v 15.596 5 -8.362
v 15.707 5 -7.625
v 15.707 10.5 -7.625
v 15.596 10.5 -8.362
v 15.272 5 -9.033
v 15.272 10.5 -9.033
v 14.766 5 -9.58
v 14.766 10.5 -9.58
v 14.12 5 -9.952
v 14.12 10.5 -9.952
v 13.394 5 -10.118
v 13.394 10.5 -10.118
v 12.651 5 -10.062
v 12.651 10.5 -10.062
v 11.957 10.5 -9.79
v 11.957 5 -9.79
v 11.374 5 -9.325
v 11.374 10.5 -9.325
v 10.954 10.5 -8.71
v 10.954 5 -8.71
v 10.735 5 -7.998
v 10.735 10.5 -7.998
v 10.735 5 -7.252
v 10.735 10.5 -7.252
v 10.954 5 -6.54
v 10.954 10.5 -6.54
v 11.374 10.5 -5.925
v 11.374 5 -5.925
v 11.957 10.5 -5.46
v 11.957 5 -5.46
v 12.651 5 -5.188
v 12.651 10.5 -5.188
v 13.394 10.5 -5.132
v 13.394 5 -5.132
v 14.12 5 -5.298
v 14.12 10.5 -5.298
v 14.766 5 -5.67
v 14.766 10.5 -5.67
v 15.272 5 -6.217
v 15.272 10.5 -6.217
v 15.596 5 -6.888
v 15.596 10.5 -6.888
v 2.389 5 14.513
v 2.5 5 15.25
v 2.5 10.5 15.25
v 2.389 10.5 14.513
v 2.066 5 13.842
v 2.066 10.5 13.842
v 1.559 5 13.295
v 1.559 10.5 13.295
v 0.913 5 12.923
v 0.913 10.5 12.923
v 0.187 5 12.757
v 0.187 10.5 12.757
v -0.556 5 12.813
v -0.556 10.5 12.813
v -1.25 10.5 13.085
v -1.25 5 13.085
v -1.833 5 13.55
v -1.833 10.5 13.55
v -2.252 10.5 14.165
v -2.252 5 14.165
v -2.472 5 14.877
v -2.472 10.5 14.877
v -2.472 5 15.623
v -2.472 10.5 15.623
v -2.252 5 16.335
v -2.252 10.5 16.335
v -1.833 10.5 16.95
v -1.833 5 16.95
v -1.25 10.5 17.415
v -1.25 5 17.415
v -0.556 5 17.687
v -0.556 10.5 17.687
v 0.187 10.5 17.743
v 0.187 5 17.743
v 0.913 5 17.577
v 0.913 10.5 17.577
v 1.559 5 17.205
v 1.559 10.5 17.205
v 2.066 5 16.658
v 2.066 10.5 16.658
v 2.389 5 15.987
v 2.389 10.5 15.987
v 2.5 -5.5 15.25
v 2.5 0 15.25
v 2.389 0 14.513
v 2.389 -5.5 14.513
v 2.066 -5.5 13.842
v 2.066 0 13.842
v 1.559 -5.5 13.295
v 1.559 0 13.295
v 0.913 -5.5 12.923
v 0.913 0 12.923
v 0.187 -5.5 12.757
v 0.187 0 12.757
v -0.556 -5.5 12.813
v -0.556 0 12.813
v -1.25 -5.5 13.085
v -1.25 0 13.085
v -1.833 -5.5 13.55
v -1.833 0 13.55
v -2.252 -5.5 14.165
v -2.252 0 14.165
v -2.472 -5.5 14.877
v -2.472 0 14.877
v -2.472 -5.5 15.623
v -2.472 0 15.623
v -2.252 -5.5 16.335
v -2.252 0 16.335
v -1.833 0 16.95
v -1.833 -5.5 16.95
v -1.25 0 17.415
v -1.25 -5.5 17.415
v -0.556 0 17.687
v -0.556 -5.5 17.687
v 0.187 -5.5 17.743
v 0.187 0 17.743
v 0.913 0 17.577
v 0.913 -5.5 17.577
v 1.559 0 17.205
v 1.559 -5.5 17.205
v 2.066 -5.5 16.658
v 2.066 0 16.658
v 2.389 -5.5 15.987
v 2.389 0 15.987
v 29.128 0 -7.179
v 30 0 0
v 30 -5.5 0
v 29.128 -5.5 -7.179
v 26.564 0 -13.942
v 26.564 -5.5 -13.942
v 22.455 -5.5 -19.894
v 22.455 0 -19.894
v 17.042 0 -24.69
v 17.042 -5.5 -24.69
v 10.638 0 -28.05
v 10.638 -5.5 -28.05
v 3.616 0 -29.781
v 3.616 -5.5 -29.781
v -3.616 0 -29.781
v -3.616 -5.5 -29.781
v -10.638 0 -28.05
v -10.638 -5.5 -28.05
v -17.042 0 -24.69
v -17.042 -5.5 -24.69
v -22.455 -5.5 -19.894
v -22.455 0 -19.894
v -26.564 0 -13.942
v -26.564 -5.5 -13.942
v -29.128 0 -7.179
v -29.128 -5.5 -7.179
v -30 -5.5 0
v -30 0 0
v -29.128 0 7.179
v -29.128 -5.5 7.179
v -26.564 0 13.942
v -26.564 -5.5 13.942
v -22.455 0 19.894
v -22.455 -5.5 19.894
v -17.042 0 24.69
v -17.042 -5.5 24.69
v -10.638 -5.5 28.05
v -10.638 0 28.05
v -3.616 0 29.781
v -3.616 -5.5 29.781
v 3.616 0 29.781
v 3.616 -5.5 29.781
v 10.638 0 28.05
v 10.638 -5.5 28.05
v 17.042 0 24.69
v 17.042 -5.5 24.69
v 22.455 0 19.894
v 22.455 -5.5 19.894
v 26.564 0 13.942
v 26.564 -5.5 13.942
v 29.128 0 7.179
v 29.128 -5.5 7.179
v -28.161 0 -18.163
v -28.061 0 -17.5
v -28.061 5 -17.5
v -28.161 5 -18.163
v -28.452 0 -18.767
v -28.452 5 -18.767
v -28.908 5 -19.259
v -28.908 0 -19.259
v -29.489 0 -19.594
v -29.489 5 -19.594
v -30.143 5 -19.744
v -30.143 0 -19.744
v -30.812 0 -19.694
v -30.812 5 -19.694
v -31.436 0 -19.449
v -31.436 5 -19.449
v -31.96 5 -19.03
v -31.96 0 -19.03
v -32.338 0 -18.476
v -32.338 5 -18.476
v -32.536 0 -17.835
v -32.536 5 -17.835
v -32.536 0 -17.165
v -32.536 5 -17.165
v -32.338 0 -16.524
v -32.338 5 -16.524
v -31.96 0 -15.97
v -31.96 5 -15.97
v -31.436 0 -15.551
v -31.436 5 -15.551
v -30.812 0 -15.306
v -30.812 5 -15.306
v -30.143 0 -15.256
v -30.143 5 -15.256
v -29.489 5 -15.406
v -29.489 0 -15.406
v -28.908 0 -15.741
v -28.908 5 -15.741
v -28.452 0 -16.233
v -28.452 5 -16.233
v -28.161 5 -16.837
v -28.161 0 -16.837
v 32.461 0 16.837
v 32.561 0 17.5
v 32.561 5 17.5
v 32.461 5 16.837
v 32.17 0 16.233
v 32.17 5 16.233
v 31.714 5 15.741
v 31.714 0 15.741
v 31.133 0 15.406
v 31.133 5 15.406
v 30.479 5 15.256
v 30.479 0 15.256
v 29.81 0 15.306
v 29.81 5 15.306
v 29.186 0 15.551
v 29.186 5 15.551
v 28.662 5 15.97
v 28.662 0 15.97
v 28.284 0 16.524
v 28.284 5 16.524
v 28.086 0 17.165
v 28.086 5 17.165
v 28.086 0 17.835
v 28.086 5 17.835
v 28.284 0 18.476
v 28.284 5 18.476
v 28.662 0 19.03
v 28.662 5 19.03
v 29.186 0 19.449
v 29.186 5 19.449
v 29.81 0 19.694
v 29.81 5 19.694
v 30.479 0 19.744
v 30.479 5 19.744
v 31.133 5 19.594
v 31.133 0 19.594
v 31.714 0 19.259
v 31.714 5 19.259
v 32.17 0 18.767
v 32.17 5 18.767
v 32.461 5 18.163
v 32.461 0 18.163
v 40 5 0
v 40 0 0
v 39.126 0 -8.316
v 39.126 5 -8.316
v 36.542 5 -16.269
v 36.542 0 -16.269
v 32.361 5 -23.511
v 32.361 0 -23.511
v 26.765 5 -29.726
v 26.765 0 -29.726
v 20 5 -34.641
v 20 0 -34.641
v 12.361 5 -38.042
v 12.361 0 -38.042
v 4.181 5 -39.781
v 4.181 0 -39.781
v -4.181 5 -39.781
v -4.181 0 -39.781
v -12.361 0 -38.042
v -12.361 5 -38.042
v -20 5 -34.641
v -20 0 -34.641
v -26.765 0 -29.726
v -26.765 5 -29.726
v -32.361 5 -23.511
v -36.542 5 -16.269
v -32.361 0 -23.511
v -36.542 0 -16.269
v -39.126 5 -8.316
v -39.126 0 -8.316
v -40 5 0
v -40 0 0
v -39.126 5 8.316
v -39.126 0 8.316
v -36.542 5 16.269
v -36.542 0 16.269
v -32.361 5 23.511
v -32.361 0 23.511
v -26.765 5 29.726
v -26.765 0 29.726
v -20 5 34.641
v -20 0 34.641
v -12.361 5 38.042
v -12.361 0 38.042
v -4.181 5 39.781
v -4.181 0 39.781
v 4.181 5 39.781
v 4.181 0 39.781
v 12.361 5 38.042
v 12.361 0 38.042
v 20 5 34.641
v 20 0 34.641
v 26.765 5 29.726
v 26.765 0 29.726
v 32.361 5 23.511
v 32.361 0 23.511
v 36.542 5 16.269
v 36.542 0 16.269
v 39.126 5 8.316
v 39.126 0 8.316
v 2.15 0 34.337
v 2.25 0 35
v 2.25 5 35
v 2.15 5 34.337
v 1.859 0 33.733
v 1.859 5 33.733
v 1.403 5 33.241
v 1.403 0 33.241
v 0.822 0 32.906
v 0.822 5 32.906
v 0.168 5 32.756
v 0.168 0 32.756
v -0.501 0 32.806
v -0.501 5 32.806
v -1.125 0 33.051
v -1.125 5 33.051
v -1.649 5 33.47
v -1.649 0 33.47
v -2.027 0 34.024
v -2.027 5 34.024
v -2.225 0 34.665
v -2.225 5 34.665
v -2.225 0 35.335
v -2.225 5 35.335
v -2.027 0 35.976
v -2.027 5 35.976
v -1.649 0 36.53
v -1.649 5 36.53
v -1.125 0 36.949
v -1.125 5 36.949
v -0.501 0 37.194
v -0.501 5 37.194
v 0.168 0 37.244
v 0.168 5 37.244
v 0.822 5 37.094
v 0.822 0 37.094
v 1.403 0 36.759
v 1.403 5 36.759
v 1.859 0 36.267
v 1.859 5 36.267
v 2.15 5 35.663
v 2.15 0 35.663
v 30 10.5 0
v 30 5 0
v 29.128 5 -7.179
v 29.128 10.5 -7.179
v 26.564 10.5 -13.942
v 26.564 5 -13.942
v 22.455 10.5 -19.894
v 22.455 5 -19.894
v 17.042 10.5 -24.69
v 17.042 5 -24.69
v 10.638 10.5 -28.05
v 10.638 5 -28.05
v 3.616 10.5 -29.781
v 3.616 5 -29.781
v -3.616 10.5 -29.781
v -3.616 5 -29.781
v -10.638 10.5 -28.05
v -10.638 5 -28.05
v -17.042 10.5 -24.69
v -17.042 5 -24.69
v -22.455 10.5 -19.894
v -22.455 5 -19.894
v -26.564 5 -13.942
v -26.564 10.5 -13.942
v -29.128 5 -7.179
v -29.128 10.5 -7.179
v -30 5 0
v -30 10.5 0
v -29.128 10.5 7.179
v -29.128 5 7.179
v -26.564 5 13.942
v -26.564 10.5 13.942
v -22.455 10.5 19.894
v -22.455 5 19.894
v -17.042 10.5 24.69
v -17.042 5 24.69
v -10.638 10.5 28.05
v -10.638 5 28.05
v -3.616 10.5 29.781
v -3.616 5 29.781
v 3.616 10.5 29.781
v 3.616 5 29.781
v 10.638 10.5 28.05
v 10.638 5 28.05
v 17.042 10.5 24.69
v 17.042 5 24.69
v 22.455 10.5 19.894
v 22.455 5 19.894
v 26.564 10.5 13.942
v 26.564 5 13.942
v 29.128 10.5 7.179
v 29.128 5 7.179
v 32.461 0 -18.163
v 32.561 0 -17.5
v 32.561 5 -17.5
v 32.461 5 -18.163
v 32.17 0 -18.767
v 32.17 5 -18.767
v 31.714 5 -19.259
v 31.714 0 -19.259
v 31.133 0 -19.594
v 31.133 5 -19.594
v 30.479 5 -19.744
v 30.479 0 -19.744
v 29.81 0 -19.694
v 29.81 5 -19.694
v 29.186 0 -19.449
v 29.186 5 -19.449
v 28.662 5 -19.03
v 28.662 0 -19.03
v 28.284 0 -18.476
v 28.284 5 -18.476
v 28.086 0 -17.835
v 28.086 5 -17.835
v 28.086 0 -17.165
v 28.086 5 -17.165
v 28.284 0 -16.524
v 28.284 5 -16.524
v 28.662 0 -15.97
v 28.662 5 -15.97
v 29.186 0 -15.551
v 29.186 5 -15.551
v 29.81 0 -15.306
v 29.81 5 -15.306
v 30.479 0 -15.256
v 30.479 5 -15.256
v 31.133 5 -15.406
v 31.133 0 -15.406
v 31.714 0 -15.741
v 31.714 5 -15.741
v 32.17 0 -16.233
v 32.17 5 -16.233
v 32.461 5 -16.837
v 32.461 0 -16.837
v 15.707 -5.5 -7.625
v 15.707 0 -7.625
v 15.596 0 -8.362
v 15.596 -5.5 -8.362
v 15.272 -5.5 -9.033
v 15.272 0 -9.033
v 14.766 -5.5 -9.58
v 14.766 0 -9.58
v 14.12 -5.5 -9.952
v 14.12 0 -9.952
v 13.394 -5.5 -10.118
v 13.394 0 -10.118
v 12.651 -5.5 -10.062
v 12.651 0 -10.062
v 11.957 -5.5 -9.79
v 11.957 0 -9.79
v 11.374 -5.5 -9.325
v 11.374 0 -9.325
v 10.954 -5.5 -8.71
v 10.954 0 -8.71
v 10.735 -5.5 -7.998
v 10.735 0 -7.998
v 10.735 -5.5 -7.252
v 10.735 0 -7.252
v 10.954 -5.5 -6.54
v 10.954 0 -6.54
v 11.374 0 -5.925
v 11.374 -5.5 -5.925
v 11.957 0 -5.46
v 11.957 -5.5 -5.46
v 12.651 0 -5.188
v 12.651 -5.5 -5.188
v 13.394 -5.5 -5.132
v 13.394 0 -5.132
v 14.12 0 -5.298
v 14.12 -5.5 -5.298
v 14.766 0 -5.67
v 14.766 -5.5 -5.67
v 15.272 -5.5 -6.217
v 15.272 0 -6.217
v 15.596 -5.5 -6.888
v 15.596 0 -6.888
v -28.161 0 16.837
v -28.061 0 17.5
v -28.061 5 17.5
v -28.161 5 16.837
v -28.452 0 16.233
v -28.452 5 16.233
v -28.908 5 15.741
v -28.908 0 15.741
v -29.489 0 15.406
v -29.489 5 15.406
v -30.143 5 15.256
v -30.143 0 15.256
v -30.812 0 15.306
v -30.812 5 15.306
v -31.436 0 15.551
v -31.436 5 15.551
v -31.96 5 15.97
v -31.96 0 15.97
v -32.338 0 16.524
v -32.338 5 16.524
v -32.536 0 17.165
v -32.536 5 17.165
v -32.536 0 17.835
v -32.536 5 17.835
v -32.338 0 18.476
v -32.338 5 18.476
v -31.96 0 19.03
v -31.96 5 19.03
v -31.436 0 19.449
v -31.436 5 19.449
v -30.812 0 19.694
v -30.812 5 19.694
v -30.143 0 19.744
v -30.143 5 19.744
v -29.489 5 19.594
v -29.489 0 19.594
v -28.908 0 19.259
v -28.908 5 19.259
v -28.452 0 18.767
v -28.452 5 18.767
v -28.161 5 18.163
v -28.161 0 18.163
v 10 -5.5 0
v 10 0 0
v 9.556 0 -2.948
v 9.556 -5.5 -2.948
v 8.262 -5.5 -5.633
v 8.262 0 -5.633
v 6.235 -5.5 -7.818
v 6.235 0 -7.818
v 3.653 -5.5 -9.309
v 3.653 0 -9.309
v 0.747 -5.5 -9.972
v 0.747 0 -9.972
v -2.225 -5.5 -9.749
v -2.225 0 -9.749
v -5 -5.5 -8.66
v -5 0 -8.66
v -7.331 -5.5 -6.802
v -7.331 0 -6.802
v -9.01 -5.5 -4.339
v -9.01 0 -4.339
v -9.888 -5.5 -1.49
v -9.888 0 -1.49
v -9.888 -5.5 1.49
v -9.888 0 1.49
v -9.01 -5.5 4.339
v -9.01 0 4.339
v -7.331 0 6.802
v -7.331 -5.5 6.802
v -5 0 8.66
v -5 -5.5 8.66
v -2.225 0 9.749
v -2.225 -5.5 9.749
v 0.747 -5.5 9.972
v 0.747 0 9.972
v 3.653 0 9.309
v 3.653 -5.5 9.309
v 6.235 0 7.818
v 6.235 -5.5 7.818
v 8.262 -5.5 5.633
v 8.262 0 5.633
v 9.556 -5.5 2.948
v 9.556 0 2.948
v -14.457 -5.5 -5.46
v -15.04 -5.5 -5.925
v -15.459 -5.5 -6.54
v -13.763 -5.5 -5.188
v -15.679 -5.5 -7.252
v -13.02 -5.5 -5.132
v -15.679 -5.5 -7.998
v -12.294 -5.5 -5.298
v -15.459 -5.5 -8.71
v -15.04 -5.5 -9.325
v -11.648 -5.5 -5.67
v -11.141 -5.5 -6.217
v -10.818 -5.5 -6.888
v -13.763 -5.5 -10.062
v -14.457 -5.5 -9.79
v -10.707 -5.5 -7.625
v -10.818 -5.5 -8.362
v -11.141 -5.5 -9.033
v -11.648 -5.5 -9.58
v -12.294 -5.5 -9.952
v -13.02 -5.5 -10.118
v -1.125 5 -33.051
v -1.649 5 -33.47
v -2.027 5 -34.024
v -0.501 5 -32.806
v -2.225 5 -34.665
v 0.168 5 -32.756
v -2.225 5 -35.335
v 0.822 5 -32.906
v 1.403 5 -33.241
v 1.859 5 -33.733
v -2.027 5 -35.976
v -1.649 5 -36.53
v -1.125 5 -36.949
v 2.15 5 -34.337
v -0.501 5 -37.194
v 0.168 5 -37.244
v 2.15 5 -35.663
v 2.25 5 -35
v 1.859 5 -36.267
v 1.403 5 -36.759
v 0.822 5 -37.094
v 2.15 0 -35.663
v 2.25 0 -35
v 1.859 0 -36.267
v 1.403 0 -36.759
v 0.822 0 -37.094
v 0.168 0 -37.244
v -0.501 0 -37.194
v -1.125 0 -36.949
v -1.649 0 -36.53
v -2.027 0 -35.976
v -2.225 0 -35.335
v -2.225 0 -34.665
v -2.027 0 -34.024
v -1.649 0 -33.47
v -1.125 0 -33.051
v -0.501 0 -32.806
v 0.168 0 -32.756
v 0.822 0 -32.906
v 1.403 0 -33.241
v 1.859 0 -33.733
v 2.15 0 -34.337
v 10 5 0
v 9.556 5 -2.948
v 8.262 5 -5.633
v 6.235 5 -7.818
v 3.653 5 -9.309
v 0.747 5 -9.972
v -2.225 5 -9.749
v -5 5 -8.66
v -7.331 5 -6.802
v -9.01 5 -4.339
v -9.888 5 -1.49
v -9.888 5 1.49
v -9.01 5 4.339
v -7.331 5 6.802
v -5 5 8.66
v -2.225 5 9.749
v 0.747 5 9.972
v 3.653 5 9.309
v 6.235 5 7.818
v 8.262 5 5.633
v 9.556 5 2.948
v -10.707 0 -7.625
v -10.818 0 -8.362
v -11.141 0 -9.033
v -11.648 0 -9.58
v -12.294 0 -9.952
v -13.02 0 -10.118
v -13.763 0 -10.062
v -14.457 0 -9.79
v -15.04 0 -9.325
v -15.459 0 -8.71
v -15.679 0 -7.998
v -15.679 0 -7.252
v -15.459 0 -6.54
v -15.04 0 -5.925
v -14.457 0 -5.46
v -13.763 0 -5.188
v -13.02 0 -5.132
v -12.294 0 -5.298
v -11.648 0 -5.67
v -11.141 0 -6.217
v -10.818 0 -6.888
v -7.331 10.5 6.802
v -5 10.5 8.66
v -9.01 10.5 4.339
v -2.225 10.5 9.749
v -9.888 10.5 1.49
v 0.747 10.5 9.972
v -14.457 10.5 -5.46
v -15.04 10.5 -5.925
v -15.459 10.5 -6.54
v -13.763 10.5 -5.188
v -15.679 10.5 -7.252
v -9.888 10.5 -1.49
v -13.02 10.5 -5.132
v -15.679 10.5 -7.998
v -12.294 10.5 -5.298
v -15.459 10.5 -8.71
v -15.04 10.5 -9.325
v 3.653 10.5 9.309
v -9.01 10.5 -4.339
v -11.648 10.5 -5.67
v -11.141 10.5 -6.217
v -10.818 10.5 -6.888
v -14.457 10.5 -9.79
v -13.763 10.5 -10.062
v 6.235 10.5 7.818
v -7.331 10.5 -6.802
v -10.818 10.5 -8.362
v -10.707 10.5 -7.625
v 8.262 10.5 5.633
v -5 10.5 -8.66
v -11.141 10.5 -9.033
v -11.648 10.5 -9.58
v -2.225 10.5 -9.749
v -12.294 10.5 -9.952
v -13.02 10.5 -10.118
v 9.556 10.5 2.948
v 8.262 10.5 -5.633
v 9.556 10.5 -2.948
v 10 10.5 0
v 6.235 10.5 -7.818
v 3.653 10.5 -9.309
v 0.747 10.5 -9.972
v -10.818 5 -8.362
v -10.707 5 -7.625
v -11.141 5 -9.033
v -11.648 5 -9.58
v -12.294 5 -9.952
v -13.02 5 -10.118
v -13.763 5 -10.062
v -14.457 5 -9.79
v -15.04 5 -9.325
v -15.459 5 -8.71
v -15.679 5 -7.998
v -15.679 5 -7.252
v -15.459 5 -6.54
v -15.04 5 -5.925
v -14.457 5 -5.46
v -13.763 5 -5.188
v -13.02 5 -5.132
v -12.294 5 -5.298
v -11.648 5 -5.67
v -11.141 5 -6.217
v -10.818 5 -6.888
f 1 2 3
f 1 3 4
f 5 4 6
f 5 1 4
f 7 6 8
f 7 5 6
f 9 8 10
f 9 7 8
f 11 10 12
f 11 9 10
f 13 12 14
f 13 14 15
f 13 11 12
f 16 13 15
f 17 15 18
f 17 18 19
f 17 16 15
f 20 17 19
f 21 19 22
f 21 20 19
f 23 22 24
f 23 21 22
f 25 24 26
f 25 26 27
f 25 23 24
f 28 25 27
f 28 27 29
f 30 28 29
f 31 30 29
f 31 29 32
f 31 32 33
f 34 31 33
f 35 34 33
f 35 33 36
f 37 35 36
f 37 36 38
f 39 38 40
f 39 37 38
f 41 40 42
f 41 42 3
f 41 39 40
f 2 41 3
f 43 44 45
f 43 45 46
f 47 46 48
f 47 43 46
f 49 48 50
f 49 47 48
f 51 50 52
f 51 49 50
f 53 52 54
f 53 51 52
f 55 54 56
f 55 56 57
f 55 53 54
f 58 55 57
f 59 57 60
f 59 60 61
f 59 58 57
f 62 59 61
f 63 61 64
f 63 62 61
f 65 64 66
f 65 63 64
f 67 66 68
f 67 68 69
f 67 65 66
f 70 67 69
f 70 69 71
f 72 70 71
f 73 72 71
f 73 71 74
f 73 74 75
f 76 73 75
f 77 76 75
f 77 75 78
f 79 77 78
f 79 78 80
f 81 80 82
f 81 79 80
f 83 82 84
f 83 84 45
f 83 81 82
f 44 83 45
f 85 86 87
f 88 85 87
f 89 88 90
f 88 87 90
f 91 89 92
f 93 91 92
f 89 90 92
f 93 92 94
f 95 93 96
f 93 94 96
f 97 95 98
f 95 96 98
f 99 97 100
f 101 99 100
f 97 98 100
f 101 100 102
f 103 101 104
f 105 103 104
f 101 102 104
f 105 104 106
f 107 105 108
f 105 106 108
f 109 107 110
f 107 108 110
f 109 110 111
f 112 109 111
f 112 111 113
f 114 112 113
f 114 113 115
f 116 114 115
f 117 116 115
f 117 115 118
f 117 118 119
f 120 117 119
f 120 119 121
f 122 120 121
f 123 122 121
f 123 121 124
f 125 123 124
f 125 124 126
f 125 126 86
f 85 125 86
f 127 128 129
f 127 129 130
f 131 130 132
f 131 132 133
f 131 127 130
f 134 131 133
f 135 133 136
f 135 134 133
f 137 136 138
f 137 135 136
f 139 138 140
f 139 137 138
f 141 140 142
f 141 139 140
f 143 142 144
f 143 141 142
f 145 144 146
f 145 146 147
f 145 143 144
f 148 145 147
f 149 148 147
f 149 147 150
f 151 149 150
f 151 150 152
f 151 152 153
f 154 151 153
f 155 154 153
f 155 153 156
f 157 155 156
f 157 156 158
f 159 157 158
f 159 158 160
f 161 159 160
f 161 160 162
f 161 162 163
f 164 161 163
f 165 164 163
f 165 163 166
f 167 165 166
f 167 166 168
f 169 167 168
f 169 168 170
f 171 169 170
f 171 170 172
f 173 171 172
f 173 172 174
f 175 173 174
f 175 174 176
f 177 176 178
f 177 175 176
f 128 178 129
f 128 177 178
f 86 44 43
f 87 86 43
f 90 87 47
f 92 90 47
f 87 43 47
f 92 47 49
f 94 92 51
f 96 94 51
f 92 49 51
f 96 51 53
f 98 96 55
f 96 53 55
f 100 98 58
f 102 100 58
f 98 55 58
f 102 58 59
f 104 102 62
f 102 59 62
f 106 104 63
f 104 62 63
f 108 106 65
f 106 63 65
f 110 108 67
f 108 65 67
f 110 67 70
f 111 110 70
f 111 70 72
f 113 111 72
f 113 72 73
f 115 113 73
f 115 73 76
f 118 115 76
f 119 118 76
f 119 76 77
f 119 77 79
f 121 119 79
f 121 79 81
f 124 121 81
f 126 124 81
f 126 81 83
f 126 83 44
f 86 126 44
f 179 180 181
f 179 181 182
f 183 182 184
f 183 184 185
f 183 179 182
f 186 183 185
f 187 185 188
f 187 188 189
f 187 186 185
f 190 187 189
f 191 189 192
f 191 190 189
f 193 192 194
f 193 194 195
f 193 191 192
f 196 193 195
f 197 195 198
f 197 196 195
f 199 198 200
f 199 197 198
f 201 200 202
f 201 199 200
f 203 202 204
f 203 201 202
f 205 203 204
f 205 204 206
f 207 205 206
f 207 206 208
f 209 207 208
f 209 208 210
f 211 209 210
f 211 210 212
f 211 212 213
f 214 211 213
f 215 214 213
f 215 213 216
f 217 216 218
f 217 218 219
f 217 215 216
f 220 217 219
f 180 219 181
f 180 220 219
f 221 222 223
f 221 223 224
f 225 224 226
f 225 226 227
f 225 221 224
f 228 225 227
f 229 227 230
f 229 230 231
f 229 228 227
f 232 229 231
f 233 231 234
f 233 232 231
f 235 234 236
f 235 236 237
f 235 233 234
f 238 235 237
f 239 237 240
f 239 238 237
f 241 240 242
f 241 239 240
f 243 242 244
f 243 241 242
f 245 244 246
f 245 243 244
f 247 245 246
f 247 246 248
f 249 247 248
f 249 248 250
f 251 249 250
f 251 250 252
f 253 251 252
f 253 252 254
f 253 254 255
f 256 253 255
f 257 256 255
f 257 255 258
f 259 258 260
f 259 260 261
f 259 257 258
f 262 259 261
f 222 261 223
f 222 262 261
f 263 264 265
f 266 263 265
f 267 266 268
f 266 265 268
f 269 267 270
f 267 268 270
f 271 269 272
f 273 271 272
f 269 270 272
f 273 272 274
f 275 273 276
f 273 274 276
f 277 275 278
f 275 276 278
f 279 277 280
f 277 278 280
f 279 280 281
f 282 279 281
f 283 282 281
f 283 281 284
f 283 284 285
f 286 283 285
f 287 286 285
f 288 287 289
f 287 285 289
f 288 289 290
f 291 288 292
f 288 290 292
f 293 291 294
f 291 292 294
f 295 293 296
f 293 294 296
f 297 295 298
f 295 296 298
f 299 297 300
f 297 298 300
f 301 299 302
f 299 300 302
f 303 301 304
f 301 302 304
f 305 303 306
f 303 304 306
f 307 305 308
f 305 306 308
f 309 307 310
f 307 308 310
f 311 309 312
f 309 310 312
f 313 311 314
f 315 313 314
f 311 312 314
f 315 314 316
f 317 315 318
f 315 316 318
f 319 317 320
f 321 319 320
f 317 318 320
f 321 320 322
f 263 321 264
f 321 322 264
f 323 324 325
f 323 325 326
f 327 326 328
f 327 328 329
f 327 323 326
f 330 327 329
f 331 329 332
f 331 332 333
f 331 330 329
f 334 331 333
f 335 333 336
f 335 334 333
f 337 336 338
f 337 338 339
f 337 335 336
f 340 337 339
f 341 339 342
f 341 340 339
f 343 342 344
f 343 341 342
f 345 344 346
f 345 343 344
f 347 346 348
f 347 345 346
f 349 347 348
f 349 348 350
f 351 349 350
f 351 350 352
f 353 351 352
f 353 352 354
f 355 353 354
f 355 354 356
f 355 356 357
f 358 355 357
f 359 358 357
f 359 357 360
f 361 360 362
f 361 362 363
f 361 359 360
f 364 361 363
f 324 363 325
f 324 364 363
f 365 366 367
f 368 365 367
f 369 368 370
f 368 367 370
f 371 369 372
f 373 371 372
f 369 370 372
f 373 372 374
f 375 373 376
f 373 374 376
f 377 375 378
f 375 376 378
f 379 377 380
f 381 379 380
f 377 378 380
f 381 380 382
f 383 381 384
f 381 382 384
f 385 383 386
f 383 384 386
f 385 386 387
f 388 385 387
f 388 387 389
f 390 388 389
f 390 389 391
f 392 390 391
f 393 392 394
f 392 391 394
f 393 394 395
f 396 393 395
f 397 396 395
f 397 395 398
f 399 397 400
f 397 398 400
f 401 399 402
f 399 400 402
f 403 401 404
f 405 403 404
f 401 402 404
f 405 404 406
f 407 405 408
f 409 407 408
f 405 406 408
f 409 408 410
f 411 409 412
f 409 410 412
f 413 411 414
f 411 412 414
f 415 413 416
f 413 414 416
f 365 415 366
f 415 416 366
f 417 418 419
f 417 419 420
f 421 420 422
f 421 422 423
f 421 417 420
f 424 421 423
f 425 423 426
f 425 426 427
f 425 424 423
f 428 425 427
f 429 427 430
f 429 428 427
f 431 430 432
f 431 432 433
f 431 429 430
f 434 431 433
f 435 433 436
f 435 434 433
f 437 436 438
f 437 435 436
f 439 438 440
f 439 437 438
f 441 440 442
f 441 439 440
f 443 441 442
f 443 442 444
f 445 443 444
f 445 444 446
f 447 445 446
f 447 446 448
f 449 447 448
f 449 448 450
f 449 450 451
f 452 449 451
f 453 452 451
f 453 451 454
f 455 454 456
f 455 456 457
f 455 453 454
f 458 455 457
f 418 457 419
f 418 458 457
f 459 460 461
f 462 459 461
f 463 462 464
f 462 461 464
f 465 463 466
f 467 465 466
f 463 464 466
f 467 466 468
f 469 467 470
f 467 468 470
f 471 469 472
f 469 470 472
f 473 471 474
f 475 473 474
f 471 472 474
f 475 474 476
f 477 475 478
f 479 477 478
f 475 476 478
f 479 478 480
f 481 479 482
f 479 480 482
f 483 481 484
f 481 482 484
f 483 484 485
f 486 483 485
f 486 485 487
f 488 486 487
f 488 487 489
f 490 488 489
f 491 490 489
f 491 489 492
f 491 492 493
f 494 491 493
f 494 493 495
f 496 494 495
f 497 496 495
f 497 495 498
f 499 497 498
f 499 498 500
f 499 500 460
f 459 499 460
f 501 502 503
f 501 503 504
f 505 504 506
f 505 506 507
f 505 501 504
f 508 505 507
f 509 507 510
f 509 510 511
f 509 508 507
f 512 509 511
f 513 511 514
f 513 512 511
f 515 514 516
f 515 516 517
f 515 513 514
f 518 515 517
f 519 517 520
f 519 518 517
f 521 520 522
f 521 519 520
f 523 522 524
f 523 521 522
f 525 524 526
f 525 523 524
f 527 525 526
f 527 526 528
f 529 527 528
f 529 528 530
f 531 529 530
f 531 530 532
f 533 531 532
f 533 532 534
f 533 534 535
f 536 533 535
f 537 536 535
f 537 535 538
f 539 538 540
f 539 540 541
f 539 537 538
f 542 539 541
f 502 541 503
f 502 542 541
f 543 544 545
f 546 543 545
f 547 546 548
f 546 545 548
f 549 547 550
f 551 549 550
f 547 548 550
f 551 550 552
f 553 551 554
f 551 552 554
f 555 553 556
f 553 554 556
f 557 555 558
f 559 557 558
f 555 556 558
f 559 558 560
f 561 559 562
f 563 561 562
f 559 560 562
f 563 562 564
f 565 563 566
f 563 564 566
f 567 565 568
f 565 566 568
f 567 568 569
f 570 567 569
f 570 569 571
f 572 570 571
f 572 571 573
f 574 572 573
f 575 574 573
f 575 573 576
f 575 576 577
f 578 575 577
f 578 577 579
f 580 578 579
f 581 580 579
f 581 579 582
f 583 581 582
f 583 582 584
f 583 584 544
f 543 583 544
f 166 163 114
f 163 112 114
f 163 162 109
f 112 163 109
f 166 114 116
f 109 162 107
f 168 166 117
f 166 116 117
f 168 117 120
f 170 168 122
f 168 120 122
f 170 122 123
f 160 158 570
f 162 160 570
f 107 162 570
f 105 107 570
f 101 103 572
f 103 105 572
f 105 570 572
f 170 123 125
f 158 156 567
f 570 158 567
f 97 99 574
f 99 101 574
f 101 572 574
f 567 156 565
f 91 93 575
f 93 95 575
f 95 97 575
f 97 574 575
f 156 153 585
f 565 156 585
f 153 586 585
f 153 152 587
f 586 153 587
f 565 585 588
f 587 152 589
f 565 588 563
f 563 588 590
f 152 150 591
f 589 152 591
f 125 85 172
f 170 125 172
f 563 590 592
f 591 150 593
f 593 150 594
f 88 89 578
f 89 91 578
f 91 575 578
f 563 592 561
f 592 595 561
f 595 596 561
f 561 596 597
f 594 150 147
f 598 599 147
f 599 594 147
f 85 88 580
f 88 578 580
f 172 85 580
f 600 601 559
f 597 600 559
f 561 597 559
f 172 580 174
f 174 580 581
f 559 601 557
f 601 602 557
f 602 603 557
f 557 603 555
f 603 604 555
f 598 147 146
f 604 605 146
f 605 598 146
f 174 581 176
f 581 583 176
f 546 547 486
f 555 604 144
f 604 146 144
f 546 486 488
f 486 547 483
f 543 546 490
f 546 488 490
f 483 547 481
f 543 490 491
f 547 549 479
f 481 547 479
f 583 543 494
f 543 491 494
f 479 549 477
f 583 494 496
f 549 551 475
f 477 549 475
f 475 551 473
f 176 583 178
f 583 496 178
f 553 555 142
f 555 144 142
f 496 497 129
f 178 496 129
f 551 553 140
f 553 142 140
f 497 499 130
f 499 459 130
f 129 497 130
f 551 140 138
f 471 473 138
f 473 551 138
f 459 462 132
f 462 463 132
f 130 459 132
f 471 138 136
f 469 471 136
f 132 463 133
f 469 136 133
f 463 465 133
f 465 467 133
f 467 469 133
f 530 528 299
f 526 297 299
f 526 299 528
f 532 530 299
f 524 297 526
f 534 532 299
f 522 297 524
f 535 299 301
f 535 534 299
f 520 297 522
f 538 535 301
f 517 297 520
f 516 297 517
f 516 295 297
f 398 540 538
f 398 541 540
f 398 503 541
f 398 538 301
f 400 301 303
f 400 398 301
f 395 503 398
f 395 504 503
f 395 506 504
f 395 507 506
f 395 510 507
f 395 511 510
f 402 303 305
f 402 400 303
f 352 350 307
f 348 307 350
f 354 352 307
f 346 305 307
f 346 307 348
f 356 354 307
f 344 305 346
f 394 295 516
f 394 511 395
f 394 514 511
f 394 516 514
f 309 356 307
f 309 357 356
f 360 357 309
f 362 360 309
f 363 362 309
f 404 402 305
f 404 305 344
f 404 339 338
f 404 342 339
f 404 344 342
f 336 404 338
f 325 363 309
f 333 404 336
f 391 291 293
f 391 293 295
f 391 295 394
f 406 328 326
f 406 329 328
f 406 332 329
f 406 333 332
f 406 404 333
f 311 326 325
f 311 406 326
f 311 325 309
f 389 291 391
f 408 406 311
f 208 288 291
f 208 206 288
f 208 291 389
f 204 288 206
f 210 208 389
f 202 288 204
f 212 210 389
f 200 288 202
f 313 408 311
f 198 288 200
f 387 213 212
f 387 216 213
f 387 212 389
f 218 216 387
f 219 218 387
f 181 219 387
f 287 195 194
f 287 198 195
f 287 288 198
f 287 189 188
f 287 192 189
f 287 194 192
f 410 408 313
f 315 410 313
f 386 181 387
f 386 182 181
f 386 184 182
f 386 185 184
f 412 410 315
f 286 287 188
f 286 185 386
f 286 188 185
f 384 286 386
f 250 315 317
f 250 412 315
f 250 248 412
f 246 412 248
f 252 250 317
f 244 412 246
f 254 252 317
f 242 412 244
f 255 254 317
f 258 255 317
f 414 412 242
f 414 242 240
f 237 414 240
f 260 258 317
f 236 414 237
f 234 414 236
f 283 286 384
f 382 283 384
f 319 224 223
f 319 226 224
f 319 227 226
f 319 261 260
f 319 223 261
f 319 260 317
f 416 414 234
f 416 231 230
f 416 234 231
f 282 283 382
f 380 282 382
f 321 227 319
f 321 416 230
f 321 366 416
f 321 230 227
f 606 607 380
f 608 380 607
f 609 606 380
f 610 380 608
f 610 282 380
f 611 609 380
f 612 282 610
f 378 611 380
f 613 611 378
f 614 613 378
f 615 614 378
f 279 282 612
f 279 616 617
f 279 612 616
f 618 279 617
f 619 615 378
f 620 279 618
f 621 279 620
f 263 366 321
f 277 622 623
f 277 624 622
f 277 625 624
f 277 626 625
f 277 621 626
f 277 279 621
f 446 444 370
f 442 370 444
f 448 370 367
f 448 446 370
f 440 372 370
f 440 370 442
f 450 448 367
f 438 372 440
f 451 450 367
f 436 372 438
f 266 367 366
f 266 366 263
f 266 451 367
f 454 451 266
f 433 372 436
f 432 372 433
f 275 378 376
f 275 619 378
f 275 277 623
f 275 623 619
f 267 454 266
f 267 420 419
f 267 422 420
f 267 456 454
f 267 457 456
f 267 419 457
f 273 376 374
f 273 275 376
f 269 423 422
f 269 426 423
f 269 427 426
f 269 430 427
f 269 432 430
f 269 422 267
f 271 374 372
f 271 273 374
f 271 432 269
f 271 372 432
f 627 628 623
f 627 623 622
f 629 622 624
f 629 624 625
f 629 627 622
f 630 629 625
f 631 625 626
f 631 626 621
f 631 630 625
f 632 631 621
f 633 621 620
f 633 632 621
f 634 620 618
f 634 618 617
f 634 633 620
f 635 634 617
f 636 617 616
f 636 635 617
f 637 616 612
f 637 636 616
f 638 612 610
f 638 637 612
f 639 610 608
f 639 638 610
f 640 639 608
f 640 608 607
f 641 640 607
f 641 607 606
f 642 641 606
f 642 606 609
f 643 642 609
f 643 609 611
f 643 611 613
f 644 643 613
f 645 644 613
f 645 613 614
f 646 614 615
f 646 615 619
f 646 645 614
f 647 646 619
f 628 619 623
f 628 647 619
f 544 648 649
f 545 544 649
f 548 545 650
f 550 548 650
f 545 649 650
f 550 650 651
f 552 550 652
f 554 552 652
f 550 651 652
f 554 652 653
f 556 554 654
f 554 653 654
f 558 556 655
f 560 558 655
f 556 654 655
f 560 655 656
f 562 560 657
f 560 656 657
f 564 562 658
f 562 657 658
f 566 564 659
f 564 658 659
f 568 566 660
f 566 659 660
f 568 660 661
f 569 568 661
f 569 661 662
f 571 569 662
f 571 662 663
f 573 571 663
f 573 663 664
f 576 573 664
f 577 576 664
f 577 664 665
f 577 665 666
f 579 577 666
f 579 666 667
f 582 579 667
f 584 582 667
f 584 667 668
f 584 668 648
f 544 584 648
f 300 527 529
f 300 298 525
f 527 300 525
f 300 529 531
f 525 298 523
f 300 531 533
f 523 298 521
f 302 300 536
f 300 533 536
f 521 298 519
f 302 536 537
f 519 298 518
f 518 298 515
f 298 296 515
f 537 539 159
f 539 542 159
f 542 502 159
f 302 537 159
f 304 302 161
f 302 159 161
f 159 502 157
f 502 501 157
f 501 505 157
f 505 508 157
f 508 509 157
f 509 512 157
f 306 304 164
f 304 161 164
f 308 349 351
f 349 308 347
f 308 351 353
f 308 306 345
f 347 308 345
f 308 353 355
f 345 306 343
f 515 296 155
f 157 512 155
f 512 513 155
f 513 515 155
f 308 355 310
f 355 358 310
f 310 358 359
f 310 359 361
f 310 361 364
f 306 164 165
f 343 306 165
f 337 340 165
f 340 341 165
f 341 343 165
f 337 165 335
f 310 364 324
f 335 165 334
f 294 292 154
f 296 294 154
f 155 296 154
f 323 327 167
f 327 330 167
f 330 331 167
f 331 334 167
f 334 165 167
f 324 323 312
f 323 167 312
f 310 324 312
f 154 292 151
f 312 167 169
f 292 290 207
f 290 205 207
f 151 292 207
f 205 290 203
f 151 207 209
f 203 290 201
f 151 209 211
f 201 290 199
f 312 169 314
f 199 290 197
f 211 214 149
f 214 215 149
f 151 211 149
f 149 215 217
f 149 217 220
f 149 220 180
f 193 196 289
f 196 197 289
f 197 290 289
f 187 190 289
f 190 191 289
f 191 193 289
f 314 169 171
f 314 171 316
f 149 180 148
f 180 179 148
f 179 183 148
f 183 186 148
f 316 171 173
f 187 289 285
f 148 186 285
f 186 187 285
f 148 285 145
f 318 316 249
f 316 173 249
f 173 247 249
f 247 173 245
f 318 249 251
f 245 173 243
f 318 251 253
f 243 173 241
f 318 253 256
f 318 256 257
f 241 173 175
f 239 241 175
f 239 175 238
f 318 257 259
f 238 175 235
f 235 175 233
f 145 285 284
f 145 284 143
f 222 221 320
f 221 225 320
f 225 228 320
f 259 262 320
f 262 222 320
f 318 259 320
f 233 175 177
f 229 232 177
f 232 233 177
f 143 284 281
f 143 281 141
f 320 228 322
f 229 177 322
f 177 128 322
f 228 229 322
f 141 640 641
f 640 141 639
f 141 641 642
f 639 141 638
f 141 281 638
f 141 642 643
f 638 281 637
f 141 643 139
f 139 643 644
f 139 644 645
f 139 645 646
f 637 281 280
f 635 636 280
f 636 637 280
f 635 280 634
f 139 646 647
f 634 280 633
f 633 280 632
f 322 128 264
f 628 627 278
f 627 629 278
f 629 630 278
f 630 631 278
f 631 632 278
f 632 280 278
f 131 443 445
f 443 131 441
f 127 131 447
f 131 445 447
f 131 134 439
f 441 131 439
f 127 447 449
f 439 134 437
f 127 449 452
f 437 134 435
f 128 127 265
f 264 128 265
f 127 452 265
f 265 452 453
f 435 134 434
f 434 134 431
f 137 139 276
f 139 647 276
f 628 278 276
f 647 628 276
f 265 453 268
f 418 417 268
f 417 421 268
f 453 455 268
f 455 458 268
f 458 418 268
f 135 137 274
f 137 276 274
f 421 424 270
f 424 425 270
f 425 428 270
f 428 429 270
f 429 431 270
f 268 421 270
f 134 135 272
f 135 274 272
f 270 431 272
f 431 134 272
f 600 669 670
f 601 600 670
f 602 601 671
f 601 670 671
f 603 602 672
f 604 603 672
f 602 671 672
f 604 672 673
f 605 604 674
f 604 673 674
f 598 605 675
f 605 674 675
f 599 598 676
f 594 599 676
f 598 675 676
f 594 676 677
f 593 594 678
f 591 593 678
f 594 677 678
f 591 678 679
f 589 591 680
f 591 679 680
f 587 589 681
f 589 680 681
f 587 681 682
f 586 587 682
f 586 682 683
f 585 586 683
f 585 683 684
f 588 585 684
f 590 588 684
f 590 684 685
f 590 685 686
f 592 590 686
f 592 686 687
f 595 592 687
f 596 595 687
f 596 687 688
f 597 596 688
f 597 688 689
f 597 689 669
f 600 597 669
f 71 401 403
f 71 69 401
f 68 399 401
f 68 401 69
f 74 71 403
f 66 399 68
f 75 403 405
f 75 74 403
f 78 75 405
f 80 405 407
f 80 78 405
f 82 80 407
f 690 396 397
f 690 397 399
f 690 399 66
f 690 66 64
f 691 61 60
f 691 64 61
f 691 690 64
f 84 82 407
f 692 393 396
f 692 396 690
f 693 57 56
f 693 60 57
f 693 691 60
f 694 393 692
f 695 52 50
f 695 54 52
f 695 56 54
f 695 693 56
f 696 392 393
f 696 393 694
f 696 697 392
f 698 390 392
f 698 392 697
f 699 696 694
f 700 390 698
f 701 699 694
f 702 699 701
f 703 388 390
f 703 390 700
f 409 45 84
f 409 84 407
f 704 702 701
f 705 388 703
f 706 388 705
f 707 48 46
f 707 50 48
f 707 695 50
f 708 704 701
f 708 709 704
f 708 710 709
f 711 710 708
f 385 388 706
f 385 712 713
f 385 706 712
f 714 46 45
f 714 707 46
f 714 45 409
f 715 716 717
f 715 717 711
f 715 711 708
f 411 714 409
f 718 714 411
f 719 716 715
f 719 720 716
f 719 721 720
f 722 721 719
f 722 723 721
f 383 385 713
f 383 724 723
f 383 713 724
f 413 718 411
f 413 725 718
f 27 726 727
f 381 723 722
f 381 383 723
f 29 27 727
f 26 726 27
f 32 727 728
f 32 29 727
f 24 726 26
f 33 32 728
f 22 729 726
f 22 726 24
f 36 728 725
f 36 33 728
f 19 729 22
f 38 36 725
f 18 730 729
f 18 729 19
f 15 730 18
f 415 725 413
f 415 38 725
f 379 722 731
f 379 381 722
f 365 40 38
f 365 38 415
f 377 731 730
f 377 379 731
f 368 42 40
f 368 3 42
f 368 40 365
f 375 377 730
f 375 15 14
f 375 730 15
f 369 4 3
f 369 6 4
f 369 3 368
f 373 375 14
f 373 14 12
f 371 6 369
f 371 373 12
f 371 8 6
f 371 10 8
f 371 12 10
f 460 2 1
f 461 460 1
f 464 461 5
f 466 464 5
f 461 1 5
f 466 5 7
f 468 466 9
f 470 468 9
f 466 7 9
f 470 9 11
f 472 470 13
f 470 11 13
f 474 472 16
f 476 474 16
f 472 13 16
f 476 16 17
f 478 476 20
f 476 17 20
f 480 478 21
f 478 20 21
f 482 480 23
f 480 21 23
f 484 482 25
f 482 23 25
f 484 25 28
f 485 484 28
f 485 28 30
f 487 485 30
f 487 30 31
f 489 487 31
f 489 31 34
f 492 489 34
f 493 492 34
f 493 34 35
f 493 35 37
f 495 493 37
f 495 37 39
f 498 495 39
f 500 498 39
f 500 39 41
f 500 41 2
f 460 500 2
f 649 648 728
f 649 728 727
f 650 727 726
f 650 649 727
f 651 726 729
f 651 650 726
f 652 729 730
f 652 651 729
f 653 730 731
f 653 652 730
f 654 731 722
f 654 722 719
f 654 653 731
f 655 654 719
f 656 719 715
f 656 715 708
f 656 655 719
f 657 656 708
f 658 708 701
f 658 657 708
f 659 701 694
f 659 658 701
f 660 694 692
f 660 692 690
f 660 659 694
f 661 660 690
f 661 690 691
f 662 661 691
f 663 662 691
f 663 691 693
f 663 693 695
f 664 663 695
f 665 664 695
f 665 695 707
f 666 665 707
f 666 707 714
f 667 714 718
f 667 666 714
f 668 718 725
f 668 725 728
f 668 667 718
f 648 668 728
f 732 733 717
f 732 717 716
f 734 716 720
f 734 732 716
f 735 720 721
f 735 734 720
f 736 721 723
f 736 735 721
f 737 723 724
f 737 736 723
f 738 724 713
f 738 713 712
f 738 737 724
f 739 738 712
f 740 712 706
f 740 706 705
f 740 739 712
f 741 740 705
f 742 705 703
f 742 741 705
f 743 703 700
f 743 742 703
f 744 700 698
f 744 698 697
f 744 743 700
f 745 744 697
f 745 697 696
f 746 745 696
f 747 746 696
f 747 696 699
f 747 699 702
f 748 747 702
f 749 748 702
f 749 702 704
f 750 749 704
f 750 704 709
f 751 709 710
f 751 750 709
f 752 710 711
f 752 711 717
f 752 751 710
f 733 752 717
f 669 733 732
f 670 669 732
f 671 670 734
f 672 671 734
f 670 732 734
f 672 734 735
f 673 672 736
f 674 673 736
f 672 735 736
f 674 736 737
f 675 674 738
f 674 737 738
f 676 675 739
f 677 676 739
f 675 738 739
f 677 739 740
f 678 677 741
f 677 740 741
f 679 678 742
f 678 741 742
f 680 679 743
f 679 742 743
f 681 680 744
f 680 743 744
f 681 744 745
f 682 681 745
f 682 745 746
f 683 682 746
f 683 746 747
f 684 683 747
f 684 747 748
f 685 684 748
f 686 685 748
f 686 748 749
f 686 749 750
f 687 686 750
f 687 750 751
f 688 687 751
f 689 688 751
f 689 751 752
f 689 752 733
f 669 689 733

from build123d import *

# Parameters (mm, degrees)
SKETCH1_R                = 40
SKETCH1_R_2              = 2.25
BOSS_EXTRUDE1_DEPTH      = 5
SKETCH2_R                = 30
SKETCH2_R_2              = 10
SKETCH2_R_3              = 2.5
BOSS_EXTRUDE2_DEPTH      = 5.5
BOSS_EXTRUDE2_DEPTH_BACK = 10.5
SKETCH3_R                = 2.5
SKETCH3_R_2              = 10
CUT_EXTRUDE1_DEPTH       = 17


with BuildPart() as part:
    # Sketch1 → Boss-Extrude1 (new body)
    with BuildSketch(Plane(origin=(0, 0, 0), x_dir=(1, 0, 0), z_dir=(0, 1, 0))):
        Circle(SKETCH1_R)
        with Locations((0, 35)):
            Circle(SKETCH1_R_2, mode=Mode.SUBTRACT)
        with Locations((30.310889132, 17.5)):
            Circle(SKETCH1_R_2, mode=Mode.SUBTRACT)
        with Locations((30.310889132, -17.5)):
            Circle(SKETCH1_R_2, mode=Mode.SUBTRACT)
        with Locations((0, -35)):
            Circle(SKETCH1_R_2, mode=Mode.SUBTRACT)
        with Locations((-30.310889132, -17.5)):
            Circle(SKETCH1_R_2, mode=Mode.SUBTRACT)
        with Locations((-30.310889132, 17.5)):
            Circle(SKETCH1_R_2, mode=Mode.SUBTRACT)
    extrude(amount=BOSS_EXTRUDE1_DEPTH)

    # Sketch2 → Boss-Extrude2 (add, two sides)
    with BuildSketch(Plane(origin=(0, 5, 0), x_dir=(1, 0, 0), z_dir=(0, 1, 0))) as boss_extrude2_sk:
        Circle(SKETCH2_R)
        Circle(SKETCH2_R_2, mode=Mode.SUBTRACT)
        with Locations((0, -15.25)):
            Circle(SKETCH2_R_3, mode=Mode.SUBTRACT)
        with Locations((-13.206887408, 7.625)):
            Circle(SKETCH2_R_3, mode=Mode.SUBTRACT)
        with Locations((13.206887408, 7.625)):
            Circle(SKETCH2_R_3, mode=Mode.SUBTRACT)
    extrude(amount=BOSS_EXTRUDE2_DEPTH)
    extrude(boss_extrude2_sk.sketch, amount=-BOSS_EXTRUDE2_DEPTH_BACK)

    # Sketch3 → Cut-Extrude1 (cut, through all)
    with BuildSketch(Plane(origin=(0, 10.5, 0), x_dir=(1, 0, 0), z_dir=(0, 1, 0))):
        with Locations((0, -15.25)):
            Circle(SKETCH3_R)
        with Locations((13.206887408, 7.625)):
            Circle(SKETCH3_R)
        Circle(SKETCH3_R_2)
        with Locations((-13.206887408, 7.625)):
            Circle(SKETCH3_R)
    extrude(amount=-CUT_EXTRUDE1_DEPTH, mode=Mode.SUBTRACT)


solid = part.part
